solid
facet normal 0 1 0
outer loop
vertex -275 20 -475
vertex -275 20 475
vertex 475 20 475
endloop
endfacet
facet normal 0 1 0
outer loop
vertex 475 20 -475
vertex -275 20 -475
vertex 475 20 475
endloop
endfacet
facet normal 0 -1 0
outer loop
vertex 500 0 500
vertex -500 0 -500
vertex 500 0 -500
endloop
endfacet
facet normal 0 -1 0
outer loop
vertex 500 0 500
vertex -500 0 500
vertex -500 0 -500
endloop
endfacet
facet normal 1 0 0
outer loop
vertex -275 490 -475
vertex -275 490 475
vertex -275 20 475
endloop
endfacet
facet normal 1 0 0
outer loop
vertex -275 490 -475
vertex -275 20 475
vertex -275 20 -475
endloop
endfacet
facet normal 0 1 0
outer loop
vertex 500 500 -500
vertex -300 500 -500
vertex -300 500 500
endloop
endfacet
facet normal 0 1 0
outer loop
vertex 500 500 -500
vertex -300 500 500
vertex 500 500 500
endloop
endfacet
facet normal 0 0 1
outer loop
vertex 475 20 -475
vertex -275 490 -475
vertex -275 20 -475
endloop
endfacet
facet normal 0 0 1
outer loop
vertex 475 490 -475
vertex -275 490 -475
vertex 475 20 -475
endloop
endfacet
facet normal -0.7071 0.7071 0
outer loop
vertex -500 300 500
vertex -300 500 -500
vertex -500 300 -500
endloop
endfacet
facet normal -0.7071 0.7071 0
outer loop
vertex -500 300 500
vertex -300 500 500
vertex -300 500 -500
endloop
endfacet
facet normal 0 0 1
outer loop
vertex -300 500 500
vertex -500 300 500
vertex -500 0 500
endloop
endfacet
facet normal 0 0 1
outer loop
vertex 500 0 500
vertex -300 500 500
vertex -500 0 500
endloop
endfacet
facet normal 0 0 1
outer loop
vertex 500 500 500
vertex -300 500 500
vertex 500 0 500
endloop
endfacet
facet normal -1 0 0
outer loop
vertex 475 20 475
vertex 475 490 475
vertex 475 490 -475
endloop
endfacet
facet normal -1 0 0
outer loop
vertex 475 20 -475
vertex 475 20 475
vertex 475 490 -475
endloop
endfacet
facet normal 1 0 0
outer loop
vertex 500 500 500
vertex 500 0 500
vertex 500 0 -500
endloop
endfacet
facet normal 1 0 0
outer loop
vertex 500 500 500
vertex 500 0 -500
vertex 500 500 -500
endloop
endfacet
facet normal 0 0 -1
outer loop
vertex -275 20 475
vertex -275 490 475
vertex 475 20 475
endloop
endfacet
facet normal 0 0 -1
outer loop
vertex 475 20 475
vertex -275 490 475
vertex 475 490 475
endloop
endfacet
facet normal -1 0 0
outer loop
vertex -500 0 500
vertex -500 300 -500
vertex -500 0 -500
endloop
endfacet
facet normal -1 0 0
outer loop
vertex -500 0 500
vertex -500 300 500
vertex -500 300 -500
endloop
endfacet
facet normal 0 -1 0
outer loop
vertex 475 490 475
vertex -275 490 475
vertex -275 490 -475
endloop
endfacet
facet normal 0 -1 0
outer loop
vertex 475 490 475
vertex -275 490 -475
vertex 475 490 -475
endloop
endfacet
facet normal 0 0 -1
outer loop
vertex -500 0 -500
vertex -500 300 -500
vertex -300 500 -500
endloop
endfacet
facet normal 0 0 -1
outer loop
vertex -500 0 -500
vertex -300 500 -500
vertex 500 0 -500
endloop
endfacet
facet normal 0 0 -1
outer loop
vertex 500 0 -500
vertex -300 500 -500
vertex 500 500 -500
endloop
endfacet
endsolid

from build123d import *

# Parameters (mm, degrees)
BOSS_EXTRUDE1_DEPTH = 500
SKETCH2_W           = 750
SKETCH2_H           = 950
CUT_EXTRUDE1_DEPTH  = 480
SKETCH3_W           = 750
SKETCH3_H           = 950
BOSS_EXTRUDE2_DEPTH = 10


with BuildPart() as part:
    # Sketch1 → Boss-Extrude1 (new, symmetric)
    with BuildSketch(Plane.XY):
        Polygon((-500, 0), (500, 0), (500, 500), (-300, 500), (-500, 300), align=None)
    extrude(amount=BOSS_EXTRUDE1_DEPTH, both=True)

    # Sketch2 → Cut-Extrude1 (cut)
    with BuildSketch(Plane(origin=(0, 500, 0), x_dir=(1, 0, 0), z_dir=(0, 1, 0))):
        with Locations((100, 0)):
            Rectangle(SKETCH2_W, SKETCH2_H)
    extrude(amount=-CUT_EXTRUDE1_DEPTH, mode=Mode.SUBTRACT)

    # Sketch3 → Boss-Extrude2 (add)
    with BuildSketch(Plane(origin=(0, 500, 0), x_dir=(1, 0, 0), z_dir=(0, 1, 0))):
        with Locations((100, 0)):
            Rectangle(SKETCH3_W, SKETCH3_H)
    extrude(amount=-BOSS_EXTRUDE2_DEPTH)


solid = part.part
